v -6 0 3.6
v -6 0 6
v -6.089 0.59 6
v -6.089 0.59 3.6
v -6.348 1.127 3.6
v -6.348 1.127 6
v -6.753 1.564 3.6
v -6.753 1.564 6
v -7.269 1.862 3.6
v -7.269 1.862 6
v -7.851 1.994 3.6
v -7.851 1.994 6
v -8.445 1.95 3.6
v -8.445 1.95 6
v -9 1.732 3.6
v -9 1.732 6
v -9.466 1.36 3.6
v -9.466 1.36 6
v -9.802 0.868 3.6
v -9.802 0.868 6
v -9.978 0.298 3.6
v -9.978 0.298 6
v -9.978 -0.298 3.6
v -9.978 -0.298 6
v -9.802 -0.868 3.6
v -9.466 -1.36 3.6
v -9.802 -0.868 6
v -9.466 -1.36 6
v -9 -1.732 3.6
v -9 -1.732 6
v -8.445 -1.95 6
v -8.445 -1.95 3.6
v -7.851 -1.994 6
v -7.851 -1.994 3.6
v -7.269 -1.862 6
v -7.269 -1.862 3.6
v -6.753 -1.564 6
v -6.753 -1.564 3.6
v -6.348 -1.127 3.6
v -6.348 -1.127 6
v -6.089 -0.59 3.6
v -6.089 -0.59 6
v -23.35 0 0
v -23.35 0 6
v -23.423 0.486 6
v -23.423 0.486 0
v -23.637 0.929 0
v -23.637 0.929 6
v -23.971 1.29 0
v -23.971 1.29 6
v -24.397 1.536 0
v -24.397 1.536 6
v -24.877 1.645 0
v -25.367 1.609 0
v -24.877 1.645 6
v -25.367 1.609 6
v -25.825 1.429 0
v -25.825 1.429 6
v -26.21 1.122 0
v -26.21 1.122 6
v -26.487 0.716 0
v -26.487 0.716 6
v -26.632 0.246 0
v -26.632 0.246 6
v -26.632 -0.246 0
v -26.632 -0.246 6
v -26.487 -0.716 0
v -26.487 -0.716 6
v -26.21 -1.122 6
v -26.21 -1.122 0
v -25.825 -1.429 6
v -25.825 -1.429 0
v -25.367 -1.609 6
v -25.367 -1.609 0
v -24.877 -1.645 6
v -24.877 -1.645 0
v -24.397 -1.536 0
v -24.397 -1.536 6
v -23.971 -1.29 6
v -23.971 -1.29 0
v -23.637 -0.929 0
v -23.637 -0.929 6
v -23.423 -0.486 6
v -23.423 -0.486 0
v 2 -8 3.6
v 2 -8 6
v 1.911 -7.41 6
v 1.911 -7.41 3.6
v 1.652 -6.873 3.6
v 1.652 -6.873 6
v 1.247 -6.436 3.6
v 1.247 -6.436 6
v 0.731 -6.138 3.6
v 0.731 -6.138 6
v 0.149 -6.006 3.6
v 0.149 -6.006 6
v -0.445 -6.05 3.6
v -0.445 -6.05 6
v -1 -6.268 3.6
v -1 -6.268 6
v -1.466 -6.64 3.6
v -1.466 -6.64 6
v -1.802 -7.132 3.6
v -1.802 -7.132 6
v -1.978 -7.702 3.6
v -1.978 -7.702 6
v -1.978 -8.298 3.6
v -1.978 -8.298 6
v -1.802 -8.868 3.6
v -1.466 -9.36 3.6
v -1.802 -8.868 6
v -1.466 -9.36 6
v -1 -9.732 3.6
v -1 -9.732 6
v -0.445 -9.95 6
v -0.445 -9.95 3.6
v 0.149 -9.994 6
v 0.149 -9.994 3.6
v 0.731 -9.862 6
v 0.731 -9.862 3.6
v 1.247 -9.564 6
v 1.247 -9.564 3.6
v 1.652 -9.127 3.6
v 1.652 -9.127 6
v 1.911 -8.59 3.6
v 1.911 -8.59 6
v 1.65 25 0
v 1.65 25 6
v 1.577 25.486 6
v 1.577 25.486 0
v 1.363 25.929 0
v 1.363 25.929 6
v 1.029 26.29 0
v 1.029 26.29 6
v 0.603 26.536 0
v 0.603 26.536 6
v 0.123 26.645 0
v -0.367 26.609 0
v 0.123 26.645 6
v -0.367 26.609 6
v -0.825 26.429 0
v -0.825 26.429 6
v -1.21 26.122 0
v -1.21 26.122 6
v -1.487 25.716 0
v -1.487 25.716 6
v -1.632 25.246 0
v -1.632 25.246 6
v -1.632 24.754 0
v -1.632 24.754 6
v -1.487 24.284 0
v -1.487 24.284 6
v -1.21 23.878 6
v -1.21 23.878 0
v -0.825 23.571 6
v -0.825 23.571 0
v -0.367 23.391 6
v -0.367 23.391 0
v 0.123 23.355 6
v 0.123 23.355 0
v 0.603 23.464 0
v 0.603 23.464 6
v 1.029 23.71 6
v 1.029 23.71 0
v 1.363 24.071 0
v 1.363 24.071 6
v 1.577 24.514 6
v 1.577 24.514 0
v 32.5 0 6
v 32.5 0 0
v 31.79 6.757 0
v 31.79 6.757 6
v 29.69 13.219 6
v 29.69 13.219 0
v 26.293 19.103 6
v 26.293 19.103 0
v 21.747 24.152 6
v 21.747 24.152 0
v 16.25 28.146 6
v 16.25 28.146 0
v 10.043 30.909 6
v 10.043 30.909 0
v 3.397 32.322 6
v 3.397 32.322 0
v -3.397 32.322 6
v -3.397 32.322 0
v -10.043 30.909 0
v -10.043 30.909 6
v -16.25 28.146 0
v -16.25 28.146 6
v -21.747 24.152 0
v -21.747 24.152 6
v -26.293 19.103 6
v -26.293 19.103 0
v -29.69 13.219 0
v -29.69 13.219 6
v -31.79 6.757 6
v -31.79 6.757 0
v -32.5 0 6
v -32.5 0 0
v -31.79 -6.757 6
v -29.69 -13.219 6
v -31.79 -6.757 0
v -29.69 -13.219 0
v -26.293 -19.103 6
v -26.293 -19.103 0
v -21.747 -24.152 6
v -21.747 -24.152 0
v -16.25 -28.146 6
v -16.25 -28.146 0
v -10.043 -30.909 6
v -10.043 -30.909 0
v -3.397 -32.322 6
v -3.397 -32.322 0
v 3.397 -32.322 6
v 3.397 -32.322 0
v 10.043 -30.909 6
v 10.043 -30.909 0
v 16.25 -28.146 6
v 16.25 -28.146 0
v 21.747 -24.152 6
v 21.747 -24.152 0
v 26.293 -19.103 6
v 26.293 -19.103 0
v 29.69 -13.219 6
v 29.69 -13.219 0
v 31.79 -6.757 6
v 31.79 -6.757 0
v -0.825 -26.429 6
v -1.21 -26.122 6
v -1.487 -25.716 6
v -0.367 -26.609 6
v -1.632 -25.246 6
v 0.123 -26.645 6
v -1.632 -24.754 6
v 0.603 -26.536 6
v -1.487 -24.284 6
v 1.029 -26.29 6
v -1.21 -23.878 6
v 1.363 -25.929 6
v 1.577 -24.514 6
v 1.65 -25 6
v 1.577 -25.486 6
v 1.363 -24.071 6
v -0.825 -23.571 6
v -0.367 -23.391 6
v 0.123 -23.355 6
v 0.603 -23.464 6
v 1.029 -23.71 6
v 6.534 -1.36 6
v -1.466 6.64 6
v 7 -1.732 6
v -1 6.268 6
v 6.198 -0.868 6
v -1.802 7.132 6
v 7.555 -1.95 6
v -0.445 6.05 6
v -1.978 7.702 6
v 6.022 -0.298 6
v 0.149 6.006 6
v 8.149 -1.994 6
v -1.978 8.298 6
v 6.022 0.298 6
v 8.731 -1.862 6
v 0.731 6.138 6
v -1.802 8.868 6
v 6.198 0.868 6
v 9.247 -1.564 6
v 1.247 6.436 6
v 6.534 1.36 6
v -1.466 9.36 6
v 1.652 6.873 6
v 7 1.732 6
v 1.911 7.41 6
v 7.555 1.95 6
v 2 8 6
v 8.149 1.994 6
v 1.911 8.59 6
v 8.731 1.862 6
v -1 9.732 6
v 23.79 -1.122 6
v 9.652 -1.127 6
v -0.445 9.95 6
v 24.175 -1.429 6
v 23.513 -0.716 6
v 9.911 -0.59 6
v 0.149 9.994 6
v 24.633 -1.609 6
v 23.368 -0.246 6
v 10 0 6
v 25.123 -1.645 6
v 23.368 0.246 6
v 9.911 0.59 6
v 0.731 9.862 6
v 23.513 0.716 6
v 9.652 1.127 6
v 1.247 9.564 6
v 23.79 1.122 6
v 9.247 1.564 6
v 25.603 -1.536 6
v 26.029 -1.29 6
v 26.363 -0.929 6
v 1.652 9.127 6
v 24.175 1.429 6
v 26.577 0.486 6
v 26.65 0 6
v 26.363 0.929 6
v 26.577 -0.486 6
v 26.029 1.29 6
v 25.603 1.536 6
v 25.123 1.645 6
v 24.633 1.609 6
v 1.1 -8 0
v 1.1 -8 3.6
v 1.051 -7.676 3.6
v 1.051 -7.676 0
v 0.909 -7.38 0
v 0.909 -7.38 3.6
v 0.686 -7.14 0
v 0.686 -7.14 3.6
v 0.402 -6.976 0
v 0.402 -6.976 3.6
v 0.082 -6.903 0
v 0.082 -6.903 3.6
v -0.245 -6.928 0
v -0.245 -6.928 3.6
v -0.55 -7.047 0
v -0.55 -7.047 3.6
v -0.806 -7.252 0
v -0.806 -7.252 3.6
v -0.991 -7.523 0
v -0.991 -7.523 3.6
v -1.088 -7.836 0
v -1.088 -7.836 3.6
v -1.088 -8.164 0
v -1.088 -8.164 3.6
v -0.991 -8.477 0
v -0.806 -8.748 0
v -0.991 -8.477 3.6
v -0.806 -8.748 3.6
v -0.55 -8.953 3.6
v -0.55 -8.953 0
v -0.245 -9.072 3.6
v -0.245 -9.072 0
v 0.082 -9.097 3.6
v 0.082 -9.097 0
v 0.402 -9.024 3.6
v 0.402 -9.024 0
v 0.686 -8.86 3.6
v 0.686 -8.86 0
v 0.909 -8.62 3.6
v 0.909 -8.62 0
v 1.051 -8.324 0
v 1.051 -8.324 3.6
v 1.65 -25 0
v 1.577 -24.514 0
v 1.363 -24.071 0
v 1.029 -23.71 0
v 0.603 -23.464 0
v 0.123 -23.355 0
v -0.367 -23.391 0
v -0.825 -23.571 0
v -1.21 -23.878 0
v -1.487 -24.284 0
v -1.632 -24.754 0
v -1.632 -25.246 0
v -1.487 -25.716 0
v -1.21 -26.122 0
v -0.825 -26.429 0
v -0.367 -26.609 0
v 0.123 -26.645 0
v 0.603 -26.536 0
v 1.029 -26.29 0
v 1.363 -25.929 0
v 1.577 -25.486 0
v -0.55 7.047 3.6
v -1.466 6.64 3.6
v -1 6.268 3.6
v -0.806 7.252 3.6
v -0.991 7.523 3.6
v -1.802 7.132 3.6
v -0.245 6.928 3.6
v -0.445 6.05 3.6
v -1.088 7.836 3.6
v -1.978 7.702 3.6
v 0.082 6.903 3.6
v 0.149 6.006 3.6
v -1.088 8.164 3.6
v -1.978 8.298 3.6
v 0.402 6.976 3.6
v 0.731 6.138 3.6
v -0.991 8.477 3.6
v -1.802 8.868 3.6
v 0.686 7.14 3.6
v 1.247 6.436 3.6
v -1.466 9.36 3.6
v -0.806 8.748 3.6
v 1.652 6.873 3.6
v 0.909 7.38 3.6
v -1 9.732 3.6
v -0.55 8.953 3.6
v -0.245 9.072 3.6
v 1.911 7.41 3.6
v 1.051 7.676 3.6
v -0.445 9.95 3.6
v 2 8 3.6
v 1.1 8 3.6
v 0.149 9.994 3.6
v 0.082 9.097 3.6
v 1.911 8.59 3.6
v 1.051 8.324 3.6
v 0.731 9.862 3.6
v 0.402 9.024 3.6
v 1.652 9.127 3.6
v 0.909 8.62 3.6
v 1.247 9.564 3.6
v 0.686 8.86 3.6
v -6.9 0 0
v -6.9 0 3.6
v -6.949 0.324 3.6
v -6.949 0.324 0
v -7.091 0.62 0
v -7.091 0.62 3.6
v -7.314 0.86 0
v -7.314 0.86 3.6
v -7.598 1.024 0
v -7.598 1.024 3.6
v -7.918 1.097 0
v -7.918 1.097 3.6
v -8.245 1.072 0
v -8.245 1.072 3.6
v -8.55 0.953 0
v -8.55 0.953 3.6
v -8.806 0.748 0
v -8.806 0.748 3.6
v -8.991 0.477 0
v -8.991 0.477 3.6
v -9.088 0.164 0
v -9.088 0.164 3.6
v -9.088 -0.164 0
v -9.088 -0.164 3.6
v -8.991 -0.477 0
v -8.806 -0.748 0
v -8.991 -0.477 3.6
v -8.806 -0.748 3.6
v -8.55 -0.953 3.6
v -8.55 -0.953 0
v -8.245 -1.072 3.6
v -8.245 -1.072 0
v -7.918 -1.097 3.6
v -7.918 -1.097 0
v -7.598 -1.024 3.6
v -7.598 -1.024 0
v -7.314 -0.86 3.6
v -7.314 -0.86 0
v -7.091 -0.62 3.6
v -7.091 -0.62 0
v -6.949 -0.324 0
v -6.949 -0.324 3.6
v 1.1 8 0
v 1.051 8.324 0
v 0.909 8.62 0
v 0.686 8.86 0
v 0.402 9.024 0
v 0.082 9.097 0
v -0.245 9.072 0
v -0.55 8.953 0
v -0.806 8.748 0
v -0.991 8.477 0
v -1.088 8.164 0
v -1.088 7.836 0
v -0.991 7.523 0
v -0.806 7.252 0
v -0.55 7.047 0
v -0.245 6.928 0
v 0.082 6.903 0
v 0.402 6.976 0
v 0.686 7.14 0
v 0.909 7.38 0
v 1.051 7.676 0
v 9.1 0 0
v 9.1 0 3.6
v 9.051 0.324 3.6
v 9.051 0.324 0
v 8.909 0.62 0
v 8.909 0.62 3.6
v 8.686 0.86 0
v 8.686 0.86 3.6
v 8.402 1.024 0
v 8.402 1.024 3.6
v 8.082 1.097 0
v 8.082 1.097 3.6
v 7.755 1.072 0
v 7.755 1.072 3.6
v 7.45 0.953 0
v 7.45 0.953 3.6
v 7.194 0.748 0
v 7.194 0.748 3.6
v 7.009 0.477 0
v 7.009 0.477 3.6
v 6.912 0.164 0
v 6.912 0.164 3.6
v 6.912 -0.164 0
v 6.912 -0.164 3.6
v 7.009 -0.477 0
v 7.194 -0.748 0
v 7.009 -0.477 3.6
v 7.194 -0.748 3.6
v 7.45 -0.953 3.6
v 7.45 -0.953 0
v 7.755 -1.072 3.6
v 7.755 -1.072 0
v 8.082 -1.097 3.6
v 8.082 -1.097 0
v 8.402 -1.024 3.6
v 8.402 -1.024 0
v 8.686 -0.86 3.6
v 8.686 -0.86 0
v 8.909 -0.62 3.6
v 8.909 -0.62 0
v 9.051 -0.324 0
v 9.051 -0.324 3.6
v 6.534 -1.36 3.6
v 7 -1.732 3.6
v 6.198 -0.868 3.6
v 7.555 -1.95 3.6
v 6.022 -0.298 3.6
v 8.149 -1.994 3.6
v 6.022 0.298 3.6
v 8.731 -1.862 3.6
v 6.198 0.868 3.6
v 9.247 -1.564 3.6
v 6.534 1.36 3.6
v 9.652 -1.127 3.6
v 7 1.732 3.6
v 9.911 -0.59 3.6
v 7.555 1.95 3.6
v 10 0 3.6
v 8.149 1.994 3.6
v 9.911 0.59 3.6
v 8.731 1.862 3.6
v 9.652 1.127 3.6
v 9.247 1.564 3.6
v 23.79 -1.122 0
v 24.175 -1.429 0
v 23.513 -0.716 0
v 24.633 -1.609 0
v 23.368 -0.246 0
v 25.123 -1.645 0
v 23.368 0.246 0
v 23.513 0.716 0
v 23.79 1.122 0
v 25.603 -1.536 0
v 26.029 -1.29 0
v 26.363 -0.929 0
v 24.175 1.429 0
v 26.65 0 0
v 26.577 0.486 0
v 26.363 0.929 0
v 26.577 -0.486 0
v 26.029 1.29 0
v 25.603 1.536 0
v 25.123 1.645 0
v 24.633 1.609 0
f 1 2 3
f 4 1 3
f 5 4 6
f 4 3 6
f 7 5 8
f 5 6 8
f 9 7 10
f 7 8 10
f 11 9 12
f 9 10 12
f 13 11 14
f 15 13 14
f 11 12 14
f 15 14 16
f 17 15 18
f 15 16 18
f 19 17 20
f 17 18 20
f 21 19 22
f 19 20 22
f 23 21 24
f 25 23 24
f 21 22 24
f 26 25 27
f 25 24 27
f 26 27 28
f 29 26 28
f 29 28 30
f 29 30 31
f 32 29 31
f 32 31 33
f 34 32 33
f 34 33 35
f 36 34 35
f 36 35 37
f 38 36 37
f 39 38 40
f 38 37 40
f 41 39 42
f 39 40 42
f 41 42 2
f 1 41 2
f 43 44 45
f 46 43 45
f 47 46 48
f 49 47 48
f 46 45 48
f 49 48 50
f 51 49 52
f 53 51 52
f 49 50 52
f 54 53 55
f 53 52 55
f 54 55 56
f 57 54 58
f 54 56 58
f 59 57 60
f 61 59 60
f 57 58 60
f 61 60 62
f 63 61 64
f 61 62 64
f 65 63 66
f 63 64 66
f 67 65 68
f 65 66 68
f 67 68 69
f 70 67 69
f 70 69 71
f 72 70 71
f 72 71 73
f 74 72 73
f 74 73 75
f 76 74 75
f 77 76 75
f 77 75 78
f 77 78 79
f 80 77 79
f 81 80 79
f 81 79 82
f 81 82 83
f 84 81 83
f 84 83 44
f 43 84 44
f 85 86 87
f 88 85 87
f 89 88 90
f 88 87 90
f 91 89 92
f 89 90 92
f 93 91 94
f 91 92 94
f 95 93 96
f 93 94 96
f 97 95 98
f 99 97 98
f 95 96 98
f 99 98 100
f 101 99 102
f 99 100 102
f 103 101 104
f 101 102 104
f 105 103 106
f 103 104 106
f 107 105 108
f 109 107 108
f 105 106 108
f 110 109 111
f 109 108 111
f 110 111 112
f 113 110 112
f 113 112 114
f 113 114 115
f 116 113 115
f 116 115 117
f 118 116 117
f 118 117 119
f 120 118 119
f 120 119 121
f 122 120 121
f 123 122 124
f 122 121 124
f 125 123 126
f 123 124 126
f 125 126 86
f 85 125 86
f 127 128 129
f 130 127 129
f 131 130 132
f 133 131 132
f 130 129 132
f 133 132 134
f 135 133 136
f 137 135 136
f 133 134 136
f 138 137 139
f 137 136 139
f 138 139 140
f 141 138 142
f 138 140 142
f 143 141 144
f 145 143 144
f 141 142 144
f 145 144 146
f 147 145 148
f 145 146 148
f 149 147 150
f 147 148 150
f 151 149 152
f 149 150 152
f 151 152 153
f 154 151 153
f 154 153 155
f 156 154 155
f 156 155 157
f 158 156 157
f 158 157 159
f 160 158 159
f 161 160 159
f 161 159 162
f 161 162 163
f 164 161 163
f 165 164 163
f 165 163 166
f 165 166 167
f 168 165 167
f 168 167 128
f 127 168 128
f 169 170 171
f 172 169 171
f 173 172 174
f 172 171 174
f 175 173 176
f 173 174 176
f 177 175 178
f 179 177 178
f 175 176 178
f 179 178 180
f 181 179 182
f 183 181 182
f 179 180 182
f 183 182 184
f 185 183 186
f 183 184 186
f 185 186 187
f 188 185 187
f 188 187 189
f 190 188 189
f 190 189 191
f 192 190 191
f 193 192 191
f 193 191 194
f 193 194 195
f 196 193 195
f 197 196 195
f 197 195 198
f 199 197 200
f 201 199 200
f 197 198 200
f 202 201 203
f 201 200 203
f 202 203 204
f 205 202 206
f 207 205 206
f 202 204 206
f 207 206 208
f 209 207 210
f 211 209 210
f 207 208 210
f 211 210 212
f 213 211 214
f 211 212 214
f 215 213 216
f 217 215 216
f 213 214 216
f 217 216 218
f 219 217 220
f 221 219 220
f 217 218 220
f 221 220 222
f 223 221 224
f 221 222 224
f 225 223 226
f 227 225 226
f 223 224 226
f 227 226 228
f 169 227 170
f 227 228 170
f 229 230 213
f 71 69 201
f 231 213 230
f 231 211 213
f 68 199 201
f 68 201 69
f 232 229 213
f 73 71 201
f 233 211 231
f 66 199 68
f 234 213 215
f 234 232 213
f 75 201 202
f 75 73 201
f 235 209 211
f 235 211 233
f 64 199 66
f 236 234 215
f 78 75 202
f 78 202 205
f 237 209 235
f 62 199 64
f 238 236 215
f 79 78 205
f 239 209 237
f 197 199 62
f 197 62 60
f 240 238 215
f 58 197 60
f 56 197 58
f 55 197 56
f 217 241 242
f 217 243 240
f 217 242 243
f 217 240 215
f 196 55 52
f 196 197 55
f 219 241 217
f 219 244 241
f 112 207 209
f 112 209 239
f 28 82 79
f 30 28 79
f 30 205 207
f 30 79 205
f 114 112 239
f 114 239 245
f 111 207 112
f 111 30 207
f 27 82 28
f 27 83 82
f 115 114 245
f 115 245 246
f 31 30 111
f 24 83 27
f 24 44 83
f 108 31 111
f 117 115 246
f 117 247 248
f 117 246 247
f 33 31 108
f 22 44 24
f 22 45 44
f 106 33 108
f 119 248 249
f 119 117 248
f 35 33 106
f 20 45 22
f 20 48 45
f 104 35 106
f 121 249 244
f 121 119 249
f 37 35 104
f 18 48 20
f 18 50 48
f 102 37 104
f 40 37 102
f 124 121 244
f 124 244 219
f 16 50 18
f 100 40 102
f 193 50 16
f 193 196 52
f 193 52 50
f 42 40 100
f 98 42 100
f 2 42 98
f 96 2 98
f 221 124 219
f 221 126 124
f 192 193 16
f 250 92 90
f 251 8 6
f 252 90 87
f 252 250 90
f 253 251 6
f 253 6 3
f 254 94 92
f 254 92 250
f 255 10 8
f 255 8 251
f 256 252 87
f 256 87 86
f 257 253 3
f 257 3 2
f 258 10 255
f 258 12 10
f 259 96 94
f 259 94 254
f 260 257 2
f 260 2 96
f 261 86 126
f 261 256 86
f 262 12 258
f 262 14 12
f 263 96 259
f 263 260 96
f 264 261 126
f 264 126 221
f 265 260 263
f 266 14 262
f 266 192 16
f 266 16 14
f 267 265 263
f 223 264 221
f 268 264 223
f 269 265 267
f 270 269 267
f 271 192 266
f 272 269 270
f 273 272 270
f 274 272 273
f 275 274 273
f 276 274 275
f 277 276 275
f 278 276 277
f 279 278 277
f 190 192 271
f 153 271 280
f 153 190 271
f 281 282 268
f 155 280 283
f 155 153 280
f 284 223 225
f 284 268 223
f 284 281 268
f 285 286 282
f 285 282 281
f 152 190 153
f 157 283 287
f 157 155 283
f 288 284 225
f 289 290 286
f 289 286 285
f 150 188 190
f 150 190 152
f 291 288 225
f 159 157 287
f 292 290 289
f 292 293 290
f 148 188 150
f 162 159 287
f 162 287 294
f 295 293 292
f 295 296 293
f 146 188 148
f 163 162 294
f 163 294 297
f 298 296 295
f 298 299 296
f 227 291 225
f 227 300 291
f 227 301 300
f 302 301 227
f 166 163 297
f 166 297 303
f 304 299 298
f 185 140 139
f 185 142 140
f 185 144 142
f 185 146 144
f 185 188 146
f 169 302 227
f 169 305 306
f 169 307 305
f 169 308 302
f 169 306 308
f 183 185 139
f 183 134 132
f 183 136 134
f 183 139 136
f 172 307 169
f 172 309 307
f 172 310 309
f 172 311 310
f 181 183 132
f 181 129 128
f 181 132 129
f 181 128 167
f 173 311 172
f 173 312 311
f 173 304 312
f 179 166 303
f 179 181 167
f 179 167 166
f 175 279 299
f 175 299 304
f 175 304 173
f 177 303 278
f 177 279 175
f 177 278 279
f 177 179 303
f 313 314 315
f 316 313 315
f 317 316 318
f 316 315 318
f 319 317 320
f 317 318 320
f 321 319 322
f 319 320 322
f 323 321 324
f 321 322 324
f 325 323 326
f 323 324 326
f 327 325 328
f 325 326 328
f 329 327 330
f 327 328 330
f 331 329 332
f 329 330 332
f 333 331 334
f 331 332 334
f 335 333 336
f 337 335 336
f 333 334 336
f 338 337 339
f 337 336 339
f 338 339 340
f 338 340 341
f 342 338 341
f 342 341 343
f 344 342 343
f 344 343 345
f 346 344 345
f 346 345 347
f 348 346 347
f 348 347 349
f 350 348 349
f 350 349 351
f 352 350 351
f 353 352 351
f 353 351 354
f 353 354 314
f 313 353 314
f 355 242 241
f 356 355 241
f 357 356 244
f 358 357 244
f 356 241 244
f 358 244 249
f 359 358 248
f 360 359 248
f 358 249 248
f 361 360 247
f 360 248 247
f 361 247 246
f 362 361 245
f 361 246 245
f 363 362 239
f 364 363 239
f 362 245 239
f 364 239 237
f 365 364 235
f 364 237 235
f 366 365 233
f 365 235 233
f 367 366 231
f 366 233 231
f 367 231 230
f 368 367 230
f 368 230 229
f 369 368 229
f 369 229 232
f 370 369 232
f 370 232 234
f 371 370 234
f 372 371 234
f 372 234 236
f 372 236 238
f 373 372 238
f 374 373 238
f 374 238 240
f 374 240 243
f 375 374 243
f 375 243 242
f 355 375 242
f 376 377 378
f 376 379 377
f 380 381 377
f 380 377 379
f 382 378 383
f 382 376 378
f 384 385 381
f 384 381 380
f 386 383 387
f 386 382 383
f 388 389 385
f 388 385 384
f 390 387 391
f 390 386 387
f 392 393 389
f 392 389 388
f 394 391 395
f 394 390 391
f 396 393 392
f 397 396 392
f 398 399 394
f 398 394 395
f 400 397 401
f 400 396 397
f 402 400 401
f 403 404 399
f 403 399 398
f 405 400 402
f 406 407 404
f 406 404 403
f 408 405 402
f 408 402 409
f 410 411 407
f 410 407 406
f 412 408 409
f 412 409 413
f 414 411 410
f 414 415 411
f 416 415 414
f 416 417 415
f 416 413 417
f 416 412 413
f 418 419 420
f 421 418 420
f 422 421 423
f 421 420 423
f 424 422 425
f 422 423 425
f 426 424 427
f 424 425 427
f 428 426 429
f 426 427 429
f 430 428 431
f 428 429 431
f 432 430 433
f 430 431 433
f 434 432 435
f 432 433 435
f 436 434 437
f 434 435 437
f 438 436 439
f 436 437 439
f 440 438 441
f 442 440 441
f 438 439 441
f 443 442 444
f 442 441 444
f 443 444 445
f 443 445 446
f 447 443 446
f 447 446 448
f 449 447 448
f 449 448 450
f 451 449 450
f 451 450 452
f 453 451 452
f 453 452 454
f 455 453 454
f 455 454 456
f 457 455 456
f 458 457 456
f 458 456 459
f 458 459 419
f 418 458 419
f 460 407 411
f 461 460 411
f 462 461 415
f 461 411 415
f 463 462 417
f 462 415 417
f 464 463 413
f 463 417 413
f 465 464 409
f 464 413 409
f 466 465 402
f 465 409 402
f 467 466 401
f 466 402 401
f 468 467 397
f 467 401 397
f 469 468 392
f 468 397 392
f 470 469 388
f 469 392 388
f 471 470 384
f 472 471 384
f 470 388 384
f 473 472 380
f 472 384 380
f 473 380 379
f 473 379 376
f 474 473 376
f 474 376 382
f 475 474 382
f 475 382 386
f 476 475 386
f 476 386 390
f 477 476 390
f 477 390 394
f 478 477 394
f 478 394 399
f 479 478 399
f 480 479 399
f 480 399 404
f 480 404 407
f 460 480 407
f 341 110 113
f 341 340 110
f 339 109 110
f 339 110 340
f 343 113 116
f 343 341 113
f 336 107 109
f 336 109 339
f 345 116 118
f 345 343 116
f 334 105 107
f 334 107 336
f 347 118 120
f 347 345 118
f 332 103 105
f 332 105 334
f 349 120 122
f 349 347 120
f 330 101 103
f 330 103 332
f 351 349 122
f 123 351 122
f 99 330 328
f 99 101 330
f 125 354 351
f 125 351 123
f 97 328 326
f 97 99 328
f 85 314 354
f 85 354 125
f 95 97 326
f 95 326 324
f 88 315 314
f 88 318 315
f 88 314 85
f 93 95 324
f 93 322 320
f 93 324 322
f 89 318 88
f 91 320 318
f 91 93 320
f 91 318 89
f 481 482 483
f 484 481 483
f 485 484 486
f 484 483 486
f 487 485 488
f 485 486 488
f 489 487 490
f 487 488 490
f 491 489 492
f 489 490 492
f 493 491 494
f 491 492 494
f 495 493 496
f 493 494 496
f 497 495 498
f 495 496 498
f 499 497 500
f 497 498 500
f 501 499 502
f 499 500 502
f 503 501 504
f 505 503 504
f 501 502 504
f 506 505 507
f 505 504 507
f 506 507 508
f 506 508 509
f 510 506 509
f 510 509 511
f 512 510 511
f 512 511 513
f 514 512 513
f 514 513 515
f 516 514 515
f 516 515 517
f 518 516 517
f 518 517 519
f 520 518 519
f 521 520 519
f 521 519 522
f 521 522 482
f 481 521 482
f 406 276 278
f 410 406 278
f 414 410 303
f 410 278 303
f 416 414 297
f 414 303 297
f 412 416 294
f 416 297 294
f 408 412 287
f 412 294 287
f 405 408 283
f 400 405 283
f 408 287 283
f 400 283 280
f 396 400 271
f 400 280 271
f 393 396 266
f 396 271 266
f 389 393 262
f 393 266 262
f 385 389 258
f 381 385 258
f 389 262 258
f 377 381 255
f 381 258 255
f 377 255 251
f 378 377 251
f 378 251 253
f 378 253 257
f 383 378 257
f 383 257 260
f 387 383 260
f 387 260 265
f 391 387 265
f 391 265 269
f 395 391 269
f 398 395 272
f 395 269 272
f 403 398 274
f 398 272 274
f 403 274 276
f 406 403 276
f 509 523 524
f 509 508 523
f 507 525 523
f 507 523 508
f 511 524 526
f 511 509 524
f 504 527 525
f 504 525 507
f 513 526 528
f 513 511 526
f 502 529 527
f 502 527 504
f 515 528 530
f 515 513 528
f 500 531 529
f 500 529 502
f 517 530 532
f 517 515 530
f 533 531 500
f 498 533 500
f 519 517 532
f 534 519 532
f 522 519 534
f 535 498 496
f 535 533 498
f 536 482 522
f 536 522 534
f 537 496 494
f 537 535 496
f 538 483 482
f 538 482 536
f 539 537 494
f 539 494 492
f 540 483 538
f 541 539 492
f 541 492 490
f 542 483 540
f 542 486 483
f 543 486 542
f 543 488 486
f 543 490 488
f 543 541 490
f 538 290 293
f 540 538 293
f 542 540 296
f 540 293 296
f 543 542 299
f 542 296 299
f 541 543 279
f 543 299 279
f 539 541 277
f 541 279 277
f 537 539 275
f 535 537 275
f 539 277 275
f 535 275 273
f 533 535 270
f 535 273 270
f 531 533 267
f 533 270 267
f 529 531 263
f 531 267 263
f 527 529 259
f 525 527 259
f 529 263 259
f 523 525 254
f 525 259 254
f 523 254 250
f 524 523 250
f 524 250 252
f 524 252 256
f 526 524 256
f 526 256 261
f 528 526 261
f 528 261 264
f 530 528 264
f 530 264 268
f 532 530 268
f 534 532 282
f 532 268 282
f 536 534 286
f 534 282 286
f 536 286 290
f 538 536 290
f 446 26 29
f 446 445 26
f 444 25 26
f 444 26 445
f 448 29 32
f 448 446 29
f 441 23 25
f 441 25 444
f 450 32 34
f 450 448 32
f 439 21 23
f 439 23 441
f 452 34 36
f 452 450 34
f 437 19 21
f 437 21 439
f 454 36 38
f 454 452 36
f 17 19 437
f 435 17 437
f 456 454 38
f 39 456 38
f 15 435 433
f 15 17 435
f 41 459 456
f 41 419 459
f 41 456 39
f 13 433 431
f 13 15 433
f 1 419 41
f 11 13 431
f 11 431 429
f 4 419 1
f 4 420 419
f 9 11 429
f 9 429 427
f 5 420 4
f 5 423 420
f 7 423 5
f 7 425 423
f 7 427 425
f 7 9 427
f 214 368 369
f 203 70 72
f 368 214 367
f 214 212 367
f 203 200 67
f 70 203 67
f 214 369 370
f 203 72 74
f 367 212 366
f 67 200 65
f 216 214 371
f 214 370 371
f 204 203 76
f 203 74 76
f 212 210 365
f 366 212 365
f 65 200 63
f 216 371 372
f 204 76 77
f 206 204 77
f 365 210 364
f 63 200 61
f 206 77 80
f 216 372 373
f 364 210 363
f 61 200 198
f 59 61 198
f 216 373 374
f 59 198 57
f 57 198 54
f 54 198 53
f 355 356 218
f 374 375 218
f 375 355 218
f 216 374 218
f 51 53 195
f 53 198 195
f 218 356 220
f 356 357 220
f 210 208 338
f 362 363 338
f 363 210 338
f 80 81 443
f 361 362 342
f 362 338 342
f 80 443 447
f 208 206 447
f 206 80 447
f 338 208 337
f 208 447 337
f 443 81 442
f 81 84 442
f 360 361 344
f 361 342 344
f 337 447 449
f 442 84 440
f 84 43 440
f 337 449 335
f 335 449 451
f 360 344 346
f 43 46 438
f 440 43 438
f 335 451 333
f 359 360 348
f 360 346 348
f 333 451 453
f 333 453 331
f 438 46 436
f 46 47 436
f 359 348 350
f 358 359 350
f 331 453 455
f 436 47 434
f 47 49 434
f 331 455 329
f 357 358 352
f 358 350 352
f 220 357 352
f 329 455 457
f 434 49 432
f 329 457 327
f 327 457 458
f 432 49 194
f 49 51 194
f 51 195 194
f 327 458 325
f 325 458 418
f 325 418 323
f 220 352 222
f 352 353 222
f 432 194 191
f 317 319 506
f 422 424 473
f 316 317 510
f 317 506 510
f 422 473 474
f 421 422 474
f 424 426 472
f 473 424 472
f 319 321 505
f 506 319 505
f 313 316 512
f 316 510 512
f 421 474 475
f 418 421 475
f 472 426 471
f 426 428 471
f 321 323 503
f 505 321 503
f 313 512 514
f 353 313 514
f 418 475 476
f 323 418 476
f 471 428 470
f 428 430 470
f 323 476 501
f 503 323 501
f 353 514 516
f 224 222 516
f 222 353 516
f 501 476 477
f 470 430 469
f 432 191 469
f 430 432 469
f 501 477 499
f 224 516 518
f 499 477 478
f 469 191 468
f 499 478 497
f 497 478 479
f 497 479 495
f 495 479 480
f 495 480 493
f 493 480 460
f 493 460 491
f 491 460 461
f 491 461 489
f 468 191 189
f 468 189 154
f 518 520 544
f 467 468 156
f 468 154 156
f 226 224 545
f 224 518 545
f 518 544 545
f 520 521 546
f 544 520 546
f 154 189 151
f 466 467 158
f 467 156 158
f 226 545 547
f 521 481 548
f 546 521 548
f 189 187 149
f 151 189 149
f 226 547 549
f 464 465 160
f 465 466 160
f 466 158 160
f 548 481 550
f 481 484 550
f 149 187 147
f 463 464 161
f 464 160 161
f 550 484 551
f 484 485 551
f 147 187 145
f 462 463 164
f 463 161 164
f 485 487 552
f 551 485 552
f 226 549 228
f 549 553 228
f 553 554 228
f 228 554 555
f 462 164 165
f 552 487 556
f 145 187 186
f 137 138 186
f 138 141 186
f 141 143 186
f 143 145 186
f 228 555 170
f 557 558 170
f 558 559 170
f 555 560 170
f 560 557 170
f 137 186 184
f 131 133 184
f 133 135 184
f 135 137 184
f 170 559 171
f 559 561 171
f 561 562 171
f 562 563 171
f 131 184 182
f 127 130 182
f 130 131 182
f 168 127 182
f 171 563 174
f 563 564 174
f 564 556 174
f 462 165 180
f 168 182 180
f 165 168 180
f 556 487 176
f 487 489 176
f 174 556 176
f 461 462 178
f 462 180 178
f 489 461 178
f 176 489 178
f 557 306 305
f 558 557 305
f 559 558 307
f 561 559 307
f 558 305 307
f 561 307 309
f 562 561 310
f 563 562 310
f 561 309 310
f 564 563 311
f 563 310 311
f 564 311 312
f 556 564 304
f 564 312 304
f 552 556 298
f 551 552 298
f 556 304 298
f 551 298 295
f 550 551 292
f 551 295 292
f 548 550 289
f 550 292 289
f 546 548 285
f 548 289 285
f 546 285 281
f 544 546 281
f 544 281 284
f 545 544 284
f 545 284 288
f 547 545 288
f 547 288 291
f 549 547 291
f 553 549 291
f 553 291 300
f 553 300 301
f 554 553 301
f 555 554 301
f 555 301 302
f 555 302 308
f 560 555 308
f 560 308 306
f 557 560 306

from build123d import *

# Parameters (mm, degrees)
SKETCH1_R           = 32.5
BOSS_EXTRUDE1_DEPTH = 6
SKETCH16_R          = 1.1
CUT_EXTRUDE8_DEPTH  = 47.351914739
SKETCH17_R          = 2
CUT_EXTRUDE9_DEPTH  = 2.4
SKETCH12_R          = 1.65
CUT_EXTRUDE10_DEPTH = 47.351914739


with BuildPart() as part:
    # Sketch1 → Boss-Extrude1 (new body)
    with BuildSketch(Plane.XY):
        Circle(SKETCH1_R)
    extrude(amount=BOSS_EXTRUDE1_DEPTH)

    # Sketch16 → Cut-Extrude8 (cut, through all)
    with BuildSketch(Plane.XY.offset(6)):
        with Locations((8, 0)):
            Circle(SKETCH16_R)
        with Locations((-8, 0)):
            Circle(SKETCH16_R)
        with Locations((0, -8)):
            Circle(SKETCH16_R)
        with Locations((0, 8)):
            Circle(SKETCH16_R)
    extrude(amount=-CUT_EXTRUDE8_DEPTH, mode=Mode.SUBTRACT)

    # Sketch17 → Cut-Extrude9 (cut)
    with BuildSketch(Plane.XY.offset(6)):
        with Locations((8, 0)):
            Circle(SKETCH17_R)
        with Locations((-8, 0)):
            Circle(SKETCH17_R)
        with Locations((0, -8)):
            Circle(SKETCH17_R)
        with Locations((0, 8)):
            Circle(SKETCH17_R)
    extrude(amount=-CUT_EXTRUDE9_DEPTH, mode=Mode.SUBTRACT)

    # Sketch12 → Cut-Extrude10 (cut, through all)
    with BuildSketch(Plane.XY.offset(6)):
        with Locations((0, 25)):
            Circle(SKETCH12_R)
        with Locations((25, 0)):
            Circle(SKETCH12_R)
        with Locations((0, -25)):
            Circle(SKETCH12_R)
        with Locations((-25, 0)):
            Circle(SKETCH12_R)
    extrude(amount=-CUT_EXTRUDE10_DEPTH, mode=Mode.SUBTRACT)


solid = part.part
